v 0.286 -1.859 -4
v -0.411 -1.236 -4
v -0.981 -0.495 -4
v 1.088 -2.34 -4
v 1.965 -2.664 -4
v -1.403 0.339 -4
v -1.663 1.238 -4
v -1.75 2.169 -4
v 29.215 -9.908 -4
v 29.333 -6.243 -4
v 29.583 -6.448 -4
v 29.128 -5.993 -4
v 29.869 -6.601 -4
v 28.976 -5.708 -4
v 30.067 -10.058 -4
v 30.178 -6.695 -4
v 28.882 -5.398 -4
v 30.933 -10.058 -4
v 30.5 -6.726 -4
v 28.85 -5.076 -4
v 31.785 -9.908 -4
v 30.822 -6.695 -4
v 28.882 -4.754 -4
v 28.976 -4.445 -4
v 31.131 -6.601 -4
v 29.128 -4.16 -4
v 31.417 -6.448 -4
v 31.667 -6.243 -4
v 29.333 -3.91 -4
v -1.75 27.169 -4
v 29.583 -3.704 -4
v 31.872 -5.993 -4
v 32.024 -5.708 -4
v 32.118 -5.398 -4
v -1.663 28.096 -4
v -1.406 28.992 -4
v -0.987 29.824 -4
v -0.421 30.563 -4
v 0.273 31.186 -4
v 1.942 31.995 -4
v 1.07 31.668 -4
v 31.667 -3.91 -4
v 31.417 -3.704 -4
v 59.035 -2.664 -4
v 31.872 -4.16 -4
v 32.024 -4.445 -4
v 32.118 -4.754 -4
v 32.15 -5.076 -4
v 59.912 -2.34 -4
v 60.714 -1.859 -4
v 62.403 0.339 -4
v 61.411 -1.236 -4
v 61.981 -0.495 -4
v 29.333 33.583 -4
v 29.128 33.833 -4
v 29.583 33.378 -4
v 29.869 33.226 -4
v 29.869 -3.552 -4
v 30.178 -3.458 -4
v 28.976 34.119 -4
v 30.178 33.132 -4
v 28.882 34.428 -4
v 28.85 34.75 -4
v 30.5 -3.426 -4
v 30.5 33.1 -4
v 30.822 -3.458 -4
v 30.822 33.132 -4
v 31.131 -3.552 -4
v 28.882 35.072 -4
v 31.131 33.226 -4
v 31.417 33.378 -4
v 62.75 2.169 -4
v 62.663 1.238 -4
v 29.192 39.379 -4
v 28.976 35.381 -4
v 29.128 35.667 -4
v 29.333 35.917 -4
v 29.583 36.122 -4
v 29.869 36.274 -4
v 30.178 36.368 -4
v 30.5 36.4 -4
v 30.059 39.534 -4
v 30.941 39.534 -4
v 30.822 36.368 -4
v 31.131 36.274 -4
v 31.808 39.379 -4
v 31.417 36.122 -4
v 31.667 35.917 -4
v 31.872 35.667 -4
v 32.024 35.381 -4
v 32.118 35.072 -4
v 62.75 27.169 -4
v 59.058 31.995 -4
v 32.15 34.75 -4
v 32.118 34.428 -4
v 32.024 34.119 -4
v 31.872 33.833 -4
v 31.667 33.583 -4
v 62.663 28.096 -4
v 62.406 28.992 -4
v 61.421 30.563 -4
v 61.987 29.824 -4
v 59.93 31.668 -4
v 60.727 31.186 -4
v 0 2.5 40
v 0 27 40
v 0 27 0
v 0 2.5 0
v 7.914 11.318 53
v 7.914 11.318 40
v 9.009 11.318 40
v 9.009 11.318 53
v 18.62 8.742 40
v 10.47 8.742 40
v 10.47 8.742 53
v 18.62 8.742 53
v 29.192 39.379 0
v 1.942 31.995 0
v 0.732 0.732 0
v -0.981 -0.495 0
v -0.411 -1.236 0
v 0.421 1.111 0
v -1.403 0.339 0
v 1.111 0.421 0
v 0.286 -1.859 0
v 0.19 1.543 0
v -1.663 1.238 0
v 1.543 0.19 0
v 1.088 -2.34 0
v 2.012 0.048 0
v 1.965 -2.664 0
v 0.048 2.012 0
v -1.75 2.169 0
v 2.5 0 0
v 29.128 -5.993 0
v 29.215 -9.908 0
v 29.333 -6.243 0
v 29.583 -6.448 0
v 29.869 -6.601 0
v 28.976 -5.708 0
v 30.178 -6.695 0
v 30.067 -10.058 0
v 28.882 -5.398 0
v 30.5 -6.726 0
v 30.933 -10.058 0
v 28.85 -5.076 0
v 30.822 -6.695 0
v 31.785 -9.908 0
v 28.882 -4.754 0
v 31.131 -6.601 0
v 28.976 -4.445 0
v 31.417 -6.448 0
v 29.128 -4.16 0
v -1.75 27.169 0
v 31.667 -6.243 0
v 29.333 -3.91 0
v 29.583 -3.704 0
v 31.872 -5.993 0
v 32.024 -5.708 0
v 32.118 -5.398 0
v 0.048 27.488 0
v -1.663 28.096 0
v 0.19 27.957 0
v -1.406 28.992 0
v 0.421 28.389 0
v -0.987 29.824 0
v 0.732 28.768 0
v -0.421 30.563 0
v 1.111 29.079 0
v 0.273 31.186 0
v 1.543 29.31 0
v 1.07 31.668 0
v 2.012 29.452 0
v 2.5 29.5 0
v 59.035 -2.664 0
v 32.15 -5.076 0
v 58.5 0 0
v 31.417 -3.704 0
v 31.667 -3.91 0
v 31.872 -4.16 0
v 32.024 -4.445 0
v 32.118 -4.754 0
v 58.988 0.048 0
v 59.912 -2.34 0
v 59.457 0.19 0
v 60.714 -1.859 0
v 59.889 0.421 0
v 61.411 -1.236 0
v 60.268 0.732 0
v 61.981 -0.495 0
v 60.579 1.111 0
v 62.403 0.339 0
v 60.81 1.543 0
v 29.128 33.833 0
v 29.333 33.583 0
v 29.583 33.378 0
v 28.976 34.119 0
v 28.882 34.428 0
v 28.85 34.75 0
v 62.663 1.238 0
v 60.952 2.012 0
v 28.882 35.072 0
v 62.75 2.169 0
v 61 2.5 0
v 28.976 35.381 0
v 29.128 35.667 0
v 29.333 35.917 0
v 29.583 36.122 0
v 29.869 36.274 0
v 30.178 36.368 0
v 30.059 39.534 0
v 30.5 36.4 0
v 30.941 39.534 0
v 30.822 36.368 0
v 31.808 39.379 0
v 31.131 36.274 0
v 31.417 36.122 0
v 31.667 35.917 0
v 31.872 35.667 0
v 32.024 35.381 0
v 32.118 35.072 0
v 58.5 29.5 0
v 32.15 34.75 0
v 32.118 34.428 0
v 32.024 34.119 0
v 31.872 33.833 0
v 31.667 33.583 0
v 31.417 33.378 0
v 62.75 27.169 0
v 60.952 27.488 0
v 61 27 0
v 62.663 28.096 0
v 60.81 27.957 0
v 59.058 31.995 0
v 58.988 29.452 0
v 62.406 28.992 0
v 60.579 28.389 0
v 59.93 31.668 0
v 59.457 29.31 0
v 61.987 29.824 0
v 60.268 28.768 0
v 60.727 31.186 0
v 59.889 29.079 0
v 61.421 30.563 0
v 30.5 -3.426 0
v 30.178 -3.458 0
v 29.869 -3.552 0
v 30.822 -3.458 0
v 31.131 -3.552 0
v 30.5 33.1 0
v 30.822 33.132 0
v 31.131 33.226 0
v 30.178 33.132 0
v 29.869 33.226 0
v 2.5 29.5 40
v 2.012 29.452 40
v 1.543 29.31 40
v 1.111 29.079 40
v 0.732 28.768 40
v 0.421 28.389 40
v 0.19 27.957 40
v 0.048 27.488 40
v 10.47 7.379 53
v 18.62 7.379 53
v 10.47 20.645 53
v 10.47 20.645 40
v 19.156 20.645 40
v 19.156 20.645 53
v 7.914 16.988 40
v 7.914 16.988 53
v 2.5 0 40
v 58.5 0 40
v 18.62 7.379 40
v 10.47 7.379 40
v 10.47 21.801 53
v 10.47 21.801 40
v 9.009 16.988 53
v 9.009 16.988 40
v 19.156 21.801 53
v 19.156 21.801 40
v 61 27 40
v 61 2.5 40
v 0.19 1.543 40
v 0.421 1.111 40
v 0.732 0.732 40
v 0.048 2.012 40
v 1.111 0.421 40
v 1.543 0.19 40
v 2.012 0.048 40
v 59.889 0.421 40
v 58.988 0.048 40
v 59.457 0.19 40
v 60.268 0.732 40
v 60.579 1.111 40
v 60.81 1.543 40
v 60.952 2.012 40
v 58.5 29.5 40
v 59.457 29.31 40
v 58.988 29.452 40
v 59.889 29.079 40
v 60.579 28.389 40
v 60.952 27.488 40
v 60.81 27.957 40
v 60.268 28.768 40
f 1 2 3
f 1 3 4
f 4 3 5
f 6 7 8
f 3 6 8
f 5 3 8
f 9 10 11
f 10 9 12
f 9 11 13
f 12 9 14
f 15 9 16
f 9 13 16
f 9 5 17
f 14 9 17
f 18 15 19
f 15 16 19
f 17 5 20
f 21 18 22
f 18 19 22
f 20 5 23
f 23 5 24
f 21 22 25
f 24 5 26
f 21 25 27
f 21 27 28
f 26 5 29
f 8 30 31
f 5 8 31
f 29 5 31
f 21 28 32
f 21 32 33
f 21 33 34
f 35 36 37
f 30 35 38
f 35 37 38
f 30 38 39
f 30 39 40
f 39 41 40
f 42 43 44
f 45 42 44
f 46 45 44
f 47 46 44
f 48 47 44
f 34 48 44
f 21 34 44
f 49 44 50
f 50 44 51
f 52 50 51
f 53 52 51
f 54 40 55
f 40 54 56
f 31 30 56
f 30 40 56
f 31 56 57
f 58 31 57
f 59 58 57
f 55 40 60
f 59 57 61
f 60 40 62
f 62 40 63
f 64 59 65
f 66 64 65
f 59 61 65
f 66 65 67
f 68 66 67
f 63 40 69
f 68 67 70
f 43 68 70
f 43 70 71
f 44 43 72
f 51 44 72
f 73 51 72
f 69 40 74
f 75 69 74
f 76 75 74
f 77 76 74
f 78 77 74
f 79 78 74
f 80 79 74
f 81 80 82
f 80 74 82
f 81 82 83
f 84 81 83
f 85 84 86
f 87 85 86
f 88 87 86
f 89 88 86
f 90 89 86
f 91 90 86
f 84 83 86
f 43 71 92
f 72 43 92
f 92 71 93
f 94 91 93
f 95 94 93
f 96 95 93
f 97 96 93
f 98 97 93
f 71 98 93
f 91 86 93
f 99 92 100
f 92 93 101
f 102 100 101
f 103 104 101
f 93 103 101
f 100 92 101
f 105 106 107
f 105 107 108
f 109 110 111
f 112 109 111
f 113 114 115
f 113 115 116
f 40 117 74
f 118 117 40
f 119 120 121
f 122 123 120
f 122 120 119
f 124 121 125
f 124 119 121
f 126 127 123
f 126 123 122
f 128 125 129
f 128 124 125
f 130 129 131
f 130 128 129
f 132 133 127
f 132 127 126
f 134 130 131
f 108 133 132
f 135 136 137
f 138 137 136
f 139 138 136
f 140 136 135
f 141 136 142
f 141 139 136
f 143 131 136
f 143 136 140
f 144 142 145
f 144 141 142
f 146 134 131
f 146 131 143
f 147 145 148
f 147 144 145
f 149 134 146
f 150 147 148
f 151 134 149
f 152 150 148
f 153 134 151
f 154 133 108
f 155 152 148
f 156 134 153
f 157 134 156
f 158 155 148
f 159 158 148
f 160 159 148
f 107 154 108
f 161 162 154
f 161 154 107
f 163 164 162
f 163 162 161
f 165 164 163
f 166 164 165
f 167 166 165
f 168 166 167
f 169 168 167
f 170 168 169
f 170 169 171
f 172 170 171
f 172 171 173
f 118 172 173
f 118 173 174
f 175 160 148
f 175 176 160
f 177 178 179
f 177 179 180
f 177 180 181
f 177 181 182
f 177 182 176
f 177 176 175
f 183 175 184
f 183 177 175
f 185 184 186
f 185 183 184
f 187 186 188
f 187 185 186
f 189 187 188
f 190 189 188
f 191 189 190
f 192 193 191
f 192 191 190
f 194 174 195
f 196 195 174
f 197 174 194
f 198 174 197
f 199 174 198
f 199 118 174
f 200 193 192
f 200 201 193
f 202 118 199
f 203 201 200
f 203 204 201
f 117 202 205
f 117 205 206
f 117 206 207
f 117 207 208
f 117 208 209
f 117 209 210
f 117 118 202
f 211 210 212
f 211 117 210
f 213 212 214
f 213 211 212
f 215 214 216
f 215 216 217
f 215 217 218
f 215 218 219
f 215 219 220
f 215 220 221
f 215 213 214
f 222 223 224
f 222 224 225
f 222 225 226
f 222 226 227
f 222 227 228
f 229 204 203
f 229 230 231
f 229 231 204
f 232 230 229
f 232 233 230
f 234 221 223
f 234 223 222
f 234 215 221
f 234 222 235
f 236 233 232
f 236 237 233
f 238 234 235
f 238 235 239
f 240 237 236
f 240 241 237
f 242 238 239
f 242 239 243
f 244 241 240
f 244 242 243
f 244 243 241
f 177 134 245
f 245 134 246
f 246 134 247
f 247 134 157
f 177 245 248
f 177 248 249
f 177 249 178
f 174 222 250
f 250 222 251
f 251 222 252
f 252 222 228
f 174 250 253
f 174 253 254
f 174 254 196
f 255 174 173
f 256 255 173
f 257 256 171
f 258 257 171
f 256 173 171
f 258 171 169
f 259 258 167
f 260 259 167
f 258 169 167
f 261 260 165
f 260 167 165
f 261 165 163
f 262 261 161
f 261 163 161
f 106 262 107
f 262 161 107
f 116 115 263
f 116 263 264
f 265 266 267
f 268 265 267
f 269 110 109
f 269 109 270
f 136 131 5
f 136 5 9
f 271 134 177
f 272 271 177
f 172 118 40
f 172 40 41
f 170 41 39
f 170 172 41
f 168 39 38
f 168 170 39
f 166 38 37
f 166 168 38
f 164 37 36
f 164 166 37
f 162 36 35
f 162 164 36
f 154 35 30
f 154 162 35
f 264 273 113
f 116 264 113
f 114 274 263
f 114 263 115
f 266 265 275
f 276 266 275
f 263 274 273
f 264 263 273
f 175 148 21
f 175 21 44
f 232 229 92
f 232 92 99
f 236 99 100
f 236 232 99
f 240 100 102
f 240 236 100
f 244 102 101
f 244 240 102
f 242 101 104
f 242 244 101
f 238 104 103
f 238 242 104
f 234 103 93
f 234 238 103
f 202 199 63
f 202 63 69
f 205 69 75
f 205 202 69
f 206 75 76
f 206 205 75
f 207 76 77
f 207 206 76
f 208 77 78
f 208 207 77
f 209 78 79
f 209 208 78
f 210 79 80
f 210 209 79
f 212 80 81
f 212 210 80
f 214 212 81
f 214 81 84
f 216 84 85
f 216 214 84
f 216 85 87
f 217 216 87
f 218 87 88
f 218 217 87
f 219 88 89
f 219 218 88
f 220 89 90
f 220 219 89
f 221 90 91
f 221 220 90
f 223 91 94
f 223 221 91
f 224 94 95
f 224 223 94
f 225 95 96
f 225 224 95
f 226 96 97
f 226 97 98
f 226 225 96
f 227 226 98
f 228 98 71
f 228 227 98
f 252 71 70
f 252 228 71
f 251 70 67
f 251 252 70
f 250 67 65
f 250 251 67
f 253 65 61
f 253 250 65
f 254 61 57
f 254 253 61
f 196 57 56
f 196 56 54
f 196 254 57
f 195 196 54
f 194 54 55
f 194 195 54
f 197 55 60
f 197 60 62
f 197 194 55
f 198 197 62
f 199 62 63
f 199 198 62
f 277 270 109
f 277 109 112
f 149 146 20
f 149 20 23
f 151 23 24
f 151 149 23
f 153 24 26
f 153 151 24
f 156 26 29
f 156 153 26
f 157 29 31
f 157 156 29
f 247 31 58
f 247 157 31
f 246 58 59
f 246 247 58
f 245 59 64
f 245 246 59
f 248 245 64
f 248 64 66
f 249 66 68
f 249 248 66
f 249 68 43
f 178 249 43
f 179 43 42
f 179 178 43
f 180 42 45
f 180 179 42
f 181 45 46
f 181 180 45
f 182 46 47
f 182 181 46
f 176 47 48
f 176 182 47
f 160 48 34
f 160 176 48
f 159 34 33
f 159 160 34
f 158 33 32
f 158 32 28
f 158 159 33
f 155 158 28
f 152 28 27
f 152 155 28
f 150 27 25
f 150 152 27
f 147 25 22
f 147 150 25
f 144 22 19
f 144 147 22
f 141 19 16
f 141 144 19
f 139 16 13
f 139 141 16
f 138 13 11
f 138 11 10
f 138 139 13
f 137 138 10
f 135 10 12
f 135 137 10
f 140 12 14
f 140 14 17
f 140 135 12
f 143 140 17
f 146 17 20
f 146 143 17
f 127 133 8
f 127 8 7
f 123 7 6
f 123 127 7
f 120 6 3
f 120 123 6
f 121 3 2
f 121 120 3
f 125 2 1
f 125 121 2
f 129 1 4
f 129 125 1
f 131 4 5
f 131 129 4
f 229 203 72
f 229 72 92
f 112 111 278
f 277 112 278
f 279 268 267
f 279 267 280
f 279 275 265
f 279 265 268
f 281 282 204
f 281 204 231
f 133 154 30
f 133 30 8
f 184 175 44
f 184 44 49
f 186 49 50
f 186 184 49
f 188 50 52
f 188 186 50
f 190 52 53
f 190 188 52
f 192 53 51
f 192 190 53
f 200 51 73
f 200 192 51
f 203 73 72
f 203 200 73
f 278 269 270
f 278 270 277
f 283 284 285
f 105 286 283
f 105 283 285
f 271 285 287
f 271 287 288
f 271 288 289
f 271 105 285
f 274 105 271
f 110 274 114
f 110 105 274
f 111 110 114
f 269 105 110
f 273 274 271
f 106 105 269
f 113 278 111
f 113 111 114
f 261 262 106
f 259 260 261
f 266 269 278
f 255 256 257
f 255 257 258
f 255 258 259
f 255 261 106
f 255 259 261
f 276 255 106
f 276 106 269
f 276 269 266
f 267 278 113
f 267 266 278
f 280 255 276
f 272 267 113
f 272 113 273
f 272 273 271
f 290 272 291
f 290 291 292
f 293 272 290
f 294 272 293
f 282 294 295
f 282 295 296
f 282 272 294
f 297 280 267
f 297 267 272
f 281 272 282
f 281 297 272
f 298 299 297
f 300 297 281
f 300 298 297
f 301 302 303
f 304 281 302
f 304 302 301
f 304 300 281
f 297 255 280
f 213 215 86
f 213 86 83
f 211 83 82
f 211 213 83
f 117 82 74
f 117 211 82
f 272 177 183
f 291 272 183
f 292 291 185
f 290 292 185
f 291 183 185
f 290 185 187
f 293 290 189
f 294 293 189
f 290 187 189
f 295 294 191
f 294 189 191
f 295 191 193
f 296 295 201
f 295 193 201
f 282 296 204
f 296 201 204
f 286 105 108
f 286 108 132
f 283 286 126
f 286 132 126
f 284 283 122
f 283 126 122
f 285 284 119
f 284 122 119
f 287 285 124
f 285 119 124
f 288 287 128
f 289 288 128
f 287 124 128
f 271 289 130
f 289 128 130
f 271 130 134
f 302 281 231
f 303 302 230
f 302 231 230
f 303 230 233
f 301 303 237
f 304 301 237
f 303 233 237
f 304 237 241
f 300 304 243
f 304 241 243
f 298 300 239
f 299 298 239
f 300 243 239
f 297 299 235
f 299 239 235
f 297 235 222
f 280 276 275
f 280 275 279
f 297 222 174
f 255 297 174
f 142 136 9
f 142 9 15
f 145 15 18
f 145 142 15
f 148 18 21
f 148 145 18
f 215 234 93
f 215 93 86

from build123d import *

# Parameters (mm, degrees)
BOSS_EXTRUDE1_DEPTH = 40
SKETCH2_R           = 1.65
BOSS_EXTRUDE2_DEPTH = 4
SKETCH3_W           = 1.094631416
SKETCH3_H           = 5.669527591
SKETCH3_W_2         = 8.149744195
SKETCH3_H_2         = 1.362465731
SKETCH3_W_3         = 8.685881664
SKETCH3_H_3         = 1.155421961
BOSS_EXTRUDE3_DEPTH = 13


with BuildPart() as part:
    # Sketch1 → Boss-Extrude1 (new body)
    with BuildSketch(Plane.XY):
        with BuildLine():
            Line((2.5, 0), (58.5, 0))
            ThreePointArc((58.5, 0), (60.267766953, 0.732233047), (61, 2.5))
            Line((61, 2.5), (61, 27))
            ThreePointArc((61, 27), (60.267766953, 28.767766953), (58.5, 29.5))
            Line((58.5, 29.5), (2.5, 29.5))
            ThreePointArc((2.5, 29.5), (0.732233047, 28.767766953), (0, 27))
            Line((0, 27), (0, 2.5))
            ThreePointArc((0, 2.5), (0.732233047, 0.732233047), (2.5, 0))
        make_face()
    extrude(amount=BOSS_EXTRUDE1_DEPTH)

    # Sketch2 → Boss-Extrude2 (add)
    with BuildSketch(Plane(origin=(0, 0, 0), x_dir=(-1, 0, 0), z_dir=(0, 0, -1))):
        with BuildLine():
            Line((-29.192164894, 39.379309675), (-1.942164894, 31.994508834))
            ThreePointArc((-1.942164894, 31.994508834), (0.721094026, 30.206741606), (1.75, 27.168582256))
            Line((1.75, 27.168582256), (1.75, 2.168582256))
            ThreePointArc((1.75, 2.168582256), (0.71380719, -0.879077922), (-1.965293024, -2.663552674))
            Line((-1.965293024, -2.663552674), (-29.215293024, -9.908438343))
            ThreePointArc((-29.215293024, -9.908438343), (-30.5, -10.076303412), (-31.784706976, -9.908438343))
            Line((-31.784706976, -9.908438343), (-59.034706976, -2.663552674))
            ThreePointArc((-59.034706976, -2.663552674), (-61.71380719, -0.879077922), (-62.75, 2.168582256))
            Line((-62.75, 2.168582256), (-62.75, 27.168582256))
            ThreePointArc((-62.75, 27.168582256), (-61.721094026, 30.206741606), (-59.057835106, 31.994508834))
            Line((-59.057835106, 31.994508834), (-31.807835106, 39.379309675))
            ThreePointArc((-31.807835106, 39.379309675), (-30.5, 39.553383097), (-29.192164894, 39.379309675))
        make_face()
        with Locations((-30.5, 34.75)):
            Circle(SKETCH2_R, mode=Mode.SUBTRACT)
        with Locations((-30.5, -5.076303412)):
            Circle(SKETCH2_R, mode=Mode.SUBTRACT)
    extrude(amount=BOSS_EXTRUDE2_DEPTH)

    # Sketch3 → Boss-Extrude3 (add)
    with BuildSketch(Plane.XY.offset(40)):
        with Locations((8.461320631, 14.1528159)):
            Rectangle(SKETCH3_W, SKETCH3_H)
        with Locations((14.54463445, 8.060284138)):
            Rectangle(SKETCH3_W_2, SKETCH3_H_2)
        with Locations((14.812703184, 21.223135875)):
            Rectangle(SKETCH3_W_3, SKETCH3_H_3)
    extrude(amount=BOSS_EXTRUDE3_DEPTH)


solid = part.part
